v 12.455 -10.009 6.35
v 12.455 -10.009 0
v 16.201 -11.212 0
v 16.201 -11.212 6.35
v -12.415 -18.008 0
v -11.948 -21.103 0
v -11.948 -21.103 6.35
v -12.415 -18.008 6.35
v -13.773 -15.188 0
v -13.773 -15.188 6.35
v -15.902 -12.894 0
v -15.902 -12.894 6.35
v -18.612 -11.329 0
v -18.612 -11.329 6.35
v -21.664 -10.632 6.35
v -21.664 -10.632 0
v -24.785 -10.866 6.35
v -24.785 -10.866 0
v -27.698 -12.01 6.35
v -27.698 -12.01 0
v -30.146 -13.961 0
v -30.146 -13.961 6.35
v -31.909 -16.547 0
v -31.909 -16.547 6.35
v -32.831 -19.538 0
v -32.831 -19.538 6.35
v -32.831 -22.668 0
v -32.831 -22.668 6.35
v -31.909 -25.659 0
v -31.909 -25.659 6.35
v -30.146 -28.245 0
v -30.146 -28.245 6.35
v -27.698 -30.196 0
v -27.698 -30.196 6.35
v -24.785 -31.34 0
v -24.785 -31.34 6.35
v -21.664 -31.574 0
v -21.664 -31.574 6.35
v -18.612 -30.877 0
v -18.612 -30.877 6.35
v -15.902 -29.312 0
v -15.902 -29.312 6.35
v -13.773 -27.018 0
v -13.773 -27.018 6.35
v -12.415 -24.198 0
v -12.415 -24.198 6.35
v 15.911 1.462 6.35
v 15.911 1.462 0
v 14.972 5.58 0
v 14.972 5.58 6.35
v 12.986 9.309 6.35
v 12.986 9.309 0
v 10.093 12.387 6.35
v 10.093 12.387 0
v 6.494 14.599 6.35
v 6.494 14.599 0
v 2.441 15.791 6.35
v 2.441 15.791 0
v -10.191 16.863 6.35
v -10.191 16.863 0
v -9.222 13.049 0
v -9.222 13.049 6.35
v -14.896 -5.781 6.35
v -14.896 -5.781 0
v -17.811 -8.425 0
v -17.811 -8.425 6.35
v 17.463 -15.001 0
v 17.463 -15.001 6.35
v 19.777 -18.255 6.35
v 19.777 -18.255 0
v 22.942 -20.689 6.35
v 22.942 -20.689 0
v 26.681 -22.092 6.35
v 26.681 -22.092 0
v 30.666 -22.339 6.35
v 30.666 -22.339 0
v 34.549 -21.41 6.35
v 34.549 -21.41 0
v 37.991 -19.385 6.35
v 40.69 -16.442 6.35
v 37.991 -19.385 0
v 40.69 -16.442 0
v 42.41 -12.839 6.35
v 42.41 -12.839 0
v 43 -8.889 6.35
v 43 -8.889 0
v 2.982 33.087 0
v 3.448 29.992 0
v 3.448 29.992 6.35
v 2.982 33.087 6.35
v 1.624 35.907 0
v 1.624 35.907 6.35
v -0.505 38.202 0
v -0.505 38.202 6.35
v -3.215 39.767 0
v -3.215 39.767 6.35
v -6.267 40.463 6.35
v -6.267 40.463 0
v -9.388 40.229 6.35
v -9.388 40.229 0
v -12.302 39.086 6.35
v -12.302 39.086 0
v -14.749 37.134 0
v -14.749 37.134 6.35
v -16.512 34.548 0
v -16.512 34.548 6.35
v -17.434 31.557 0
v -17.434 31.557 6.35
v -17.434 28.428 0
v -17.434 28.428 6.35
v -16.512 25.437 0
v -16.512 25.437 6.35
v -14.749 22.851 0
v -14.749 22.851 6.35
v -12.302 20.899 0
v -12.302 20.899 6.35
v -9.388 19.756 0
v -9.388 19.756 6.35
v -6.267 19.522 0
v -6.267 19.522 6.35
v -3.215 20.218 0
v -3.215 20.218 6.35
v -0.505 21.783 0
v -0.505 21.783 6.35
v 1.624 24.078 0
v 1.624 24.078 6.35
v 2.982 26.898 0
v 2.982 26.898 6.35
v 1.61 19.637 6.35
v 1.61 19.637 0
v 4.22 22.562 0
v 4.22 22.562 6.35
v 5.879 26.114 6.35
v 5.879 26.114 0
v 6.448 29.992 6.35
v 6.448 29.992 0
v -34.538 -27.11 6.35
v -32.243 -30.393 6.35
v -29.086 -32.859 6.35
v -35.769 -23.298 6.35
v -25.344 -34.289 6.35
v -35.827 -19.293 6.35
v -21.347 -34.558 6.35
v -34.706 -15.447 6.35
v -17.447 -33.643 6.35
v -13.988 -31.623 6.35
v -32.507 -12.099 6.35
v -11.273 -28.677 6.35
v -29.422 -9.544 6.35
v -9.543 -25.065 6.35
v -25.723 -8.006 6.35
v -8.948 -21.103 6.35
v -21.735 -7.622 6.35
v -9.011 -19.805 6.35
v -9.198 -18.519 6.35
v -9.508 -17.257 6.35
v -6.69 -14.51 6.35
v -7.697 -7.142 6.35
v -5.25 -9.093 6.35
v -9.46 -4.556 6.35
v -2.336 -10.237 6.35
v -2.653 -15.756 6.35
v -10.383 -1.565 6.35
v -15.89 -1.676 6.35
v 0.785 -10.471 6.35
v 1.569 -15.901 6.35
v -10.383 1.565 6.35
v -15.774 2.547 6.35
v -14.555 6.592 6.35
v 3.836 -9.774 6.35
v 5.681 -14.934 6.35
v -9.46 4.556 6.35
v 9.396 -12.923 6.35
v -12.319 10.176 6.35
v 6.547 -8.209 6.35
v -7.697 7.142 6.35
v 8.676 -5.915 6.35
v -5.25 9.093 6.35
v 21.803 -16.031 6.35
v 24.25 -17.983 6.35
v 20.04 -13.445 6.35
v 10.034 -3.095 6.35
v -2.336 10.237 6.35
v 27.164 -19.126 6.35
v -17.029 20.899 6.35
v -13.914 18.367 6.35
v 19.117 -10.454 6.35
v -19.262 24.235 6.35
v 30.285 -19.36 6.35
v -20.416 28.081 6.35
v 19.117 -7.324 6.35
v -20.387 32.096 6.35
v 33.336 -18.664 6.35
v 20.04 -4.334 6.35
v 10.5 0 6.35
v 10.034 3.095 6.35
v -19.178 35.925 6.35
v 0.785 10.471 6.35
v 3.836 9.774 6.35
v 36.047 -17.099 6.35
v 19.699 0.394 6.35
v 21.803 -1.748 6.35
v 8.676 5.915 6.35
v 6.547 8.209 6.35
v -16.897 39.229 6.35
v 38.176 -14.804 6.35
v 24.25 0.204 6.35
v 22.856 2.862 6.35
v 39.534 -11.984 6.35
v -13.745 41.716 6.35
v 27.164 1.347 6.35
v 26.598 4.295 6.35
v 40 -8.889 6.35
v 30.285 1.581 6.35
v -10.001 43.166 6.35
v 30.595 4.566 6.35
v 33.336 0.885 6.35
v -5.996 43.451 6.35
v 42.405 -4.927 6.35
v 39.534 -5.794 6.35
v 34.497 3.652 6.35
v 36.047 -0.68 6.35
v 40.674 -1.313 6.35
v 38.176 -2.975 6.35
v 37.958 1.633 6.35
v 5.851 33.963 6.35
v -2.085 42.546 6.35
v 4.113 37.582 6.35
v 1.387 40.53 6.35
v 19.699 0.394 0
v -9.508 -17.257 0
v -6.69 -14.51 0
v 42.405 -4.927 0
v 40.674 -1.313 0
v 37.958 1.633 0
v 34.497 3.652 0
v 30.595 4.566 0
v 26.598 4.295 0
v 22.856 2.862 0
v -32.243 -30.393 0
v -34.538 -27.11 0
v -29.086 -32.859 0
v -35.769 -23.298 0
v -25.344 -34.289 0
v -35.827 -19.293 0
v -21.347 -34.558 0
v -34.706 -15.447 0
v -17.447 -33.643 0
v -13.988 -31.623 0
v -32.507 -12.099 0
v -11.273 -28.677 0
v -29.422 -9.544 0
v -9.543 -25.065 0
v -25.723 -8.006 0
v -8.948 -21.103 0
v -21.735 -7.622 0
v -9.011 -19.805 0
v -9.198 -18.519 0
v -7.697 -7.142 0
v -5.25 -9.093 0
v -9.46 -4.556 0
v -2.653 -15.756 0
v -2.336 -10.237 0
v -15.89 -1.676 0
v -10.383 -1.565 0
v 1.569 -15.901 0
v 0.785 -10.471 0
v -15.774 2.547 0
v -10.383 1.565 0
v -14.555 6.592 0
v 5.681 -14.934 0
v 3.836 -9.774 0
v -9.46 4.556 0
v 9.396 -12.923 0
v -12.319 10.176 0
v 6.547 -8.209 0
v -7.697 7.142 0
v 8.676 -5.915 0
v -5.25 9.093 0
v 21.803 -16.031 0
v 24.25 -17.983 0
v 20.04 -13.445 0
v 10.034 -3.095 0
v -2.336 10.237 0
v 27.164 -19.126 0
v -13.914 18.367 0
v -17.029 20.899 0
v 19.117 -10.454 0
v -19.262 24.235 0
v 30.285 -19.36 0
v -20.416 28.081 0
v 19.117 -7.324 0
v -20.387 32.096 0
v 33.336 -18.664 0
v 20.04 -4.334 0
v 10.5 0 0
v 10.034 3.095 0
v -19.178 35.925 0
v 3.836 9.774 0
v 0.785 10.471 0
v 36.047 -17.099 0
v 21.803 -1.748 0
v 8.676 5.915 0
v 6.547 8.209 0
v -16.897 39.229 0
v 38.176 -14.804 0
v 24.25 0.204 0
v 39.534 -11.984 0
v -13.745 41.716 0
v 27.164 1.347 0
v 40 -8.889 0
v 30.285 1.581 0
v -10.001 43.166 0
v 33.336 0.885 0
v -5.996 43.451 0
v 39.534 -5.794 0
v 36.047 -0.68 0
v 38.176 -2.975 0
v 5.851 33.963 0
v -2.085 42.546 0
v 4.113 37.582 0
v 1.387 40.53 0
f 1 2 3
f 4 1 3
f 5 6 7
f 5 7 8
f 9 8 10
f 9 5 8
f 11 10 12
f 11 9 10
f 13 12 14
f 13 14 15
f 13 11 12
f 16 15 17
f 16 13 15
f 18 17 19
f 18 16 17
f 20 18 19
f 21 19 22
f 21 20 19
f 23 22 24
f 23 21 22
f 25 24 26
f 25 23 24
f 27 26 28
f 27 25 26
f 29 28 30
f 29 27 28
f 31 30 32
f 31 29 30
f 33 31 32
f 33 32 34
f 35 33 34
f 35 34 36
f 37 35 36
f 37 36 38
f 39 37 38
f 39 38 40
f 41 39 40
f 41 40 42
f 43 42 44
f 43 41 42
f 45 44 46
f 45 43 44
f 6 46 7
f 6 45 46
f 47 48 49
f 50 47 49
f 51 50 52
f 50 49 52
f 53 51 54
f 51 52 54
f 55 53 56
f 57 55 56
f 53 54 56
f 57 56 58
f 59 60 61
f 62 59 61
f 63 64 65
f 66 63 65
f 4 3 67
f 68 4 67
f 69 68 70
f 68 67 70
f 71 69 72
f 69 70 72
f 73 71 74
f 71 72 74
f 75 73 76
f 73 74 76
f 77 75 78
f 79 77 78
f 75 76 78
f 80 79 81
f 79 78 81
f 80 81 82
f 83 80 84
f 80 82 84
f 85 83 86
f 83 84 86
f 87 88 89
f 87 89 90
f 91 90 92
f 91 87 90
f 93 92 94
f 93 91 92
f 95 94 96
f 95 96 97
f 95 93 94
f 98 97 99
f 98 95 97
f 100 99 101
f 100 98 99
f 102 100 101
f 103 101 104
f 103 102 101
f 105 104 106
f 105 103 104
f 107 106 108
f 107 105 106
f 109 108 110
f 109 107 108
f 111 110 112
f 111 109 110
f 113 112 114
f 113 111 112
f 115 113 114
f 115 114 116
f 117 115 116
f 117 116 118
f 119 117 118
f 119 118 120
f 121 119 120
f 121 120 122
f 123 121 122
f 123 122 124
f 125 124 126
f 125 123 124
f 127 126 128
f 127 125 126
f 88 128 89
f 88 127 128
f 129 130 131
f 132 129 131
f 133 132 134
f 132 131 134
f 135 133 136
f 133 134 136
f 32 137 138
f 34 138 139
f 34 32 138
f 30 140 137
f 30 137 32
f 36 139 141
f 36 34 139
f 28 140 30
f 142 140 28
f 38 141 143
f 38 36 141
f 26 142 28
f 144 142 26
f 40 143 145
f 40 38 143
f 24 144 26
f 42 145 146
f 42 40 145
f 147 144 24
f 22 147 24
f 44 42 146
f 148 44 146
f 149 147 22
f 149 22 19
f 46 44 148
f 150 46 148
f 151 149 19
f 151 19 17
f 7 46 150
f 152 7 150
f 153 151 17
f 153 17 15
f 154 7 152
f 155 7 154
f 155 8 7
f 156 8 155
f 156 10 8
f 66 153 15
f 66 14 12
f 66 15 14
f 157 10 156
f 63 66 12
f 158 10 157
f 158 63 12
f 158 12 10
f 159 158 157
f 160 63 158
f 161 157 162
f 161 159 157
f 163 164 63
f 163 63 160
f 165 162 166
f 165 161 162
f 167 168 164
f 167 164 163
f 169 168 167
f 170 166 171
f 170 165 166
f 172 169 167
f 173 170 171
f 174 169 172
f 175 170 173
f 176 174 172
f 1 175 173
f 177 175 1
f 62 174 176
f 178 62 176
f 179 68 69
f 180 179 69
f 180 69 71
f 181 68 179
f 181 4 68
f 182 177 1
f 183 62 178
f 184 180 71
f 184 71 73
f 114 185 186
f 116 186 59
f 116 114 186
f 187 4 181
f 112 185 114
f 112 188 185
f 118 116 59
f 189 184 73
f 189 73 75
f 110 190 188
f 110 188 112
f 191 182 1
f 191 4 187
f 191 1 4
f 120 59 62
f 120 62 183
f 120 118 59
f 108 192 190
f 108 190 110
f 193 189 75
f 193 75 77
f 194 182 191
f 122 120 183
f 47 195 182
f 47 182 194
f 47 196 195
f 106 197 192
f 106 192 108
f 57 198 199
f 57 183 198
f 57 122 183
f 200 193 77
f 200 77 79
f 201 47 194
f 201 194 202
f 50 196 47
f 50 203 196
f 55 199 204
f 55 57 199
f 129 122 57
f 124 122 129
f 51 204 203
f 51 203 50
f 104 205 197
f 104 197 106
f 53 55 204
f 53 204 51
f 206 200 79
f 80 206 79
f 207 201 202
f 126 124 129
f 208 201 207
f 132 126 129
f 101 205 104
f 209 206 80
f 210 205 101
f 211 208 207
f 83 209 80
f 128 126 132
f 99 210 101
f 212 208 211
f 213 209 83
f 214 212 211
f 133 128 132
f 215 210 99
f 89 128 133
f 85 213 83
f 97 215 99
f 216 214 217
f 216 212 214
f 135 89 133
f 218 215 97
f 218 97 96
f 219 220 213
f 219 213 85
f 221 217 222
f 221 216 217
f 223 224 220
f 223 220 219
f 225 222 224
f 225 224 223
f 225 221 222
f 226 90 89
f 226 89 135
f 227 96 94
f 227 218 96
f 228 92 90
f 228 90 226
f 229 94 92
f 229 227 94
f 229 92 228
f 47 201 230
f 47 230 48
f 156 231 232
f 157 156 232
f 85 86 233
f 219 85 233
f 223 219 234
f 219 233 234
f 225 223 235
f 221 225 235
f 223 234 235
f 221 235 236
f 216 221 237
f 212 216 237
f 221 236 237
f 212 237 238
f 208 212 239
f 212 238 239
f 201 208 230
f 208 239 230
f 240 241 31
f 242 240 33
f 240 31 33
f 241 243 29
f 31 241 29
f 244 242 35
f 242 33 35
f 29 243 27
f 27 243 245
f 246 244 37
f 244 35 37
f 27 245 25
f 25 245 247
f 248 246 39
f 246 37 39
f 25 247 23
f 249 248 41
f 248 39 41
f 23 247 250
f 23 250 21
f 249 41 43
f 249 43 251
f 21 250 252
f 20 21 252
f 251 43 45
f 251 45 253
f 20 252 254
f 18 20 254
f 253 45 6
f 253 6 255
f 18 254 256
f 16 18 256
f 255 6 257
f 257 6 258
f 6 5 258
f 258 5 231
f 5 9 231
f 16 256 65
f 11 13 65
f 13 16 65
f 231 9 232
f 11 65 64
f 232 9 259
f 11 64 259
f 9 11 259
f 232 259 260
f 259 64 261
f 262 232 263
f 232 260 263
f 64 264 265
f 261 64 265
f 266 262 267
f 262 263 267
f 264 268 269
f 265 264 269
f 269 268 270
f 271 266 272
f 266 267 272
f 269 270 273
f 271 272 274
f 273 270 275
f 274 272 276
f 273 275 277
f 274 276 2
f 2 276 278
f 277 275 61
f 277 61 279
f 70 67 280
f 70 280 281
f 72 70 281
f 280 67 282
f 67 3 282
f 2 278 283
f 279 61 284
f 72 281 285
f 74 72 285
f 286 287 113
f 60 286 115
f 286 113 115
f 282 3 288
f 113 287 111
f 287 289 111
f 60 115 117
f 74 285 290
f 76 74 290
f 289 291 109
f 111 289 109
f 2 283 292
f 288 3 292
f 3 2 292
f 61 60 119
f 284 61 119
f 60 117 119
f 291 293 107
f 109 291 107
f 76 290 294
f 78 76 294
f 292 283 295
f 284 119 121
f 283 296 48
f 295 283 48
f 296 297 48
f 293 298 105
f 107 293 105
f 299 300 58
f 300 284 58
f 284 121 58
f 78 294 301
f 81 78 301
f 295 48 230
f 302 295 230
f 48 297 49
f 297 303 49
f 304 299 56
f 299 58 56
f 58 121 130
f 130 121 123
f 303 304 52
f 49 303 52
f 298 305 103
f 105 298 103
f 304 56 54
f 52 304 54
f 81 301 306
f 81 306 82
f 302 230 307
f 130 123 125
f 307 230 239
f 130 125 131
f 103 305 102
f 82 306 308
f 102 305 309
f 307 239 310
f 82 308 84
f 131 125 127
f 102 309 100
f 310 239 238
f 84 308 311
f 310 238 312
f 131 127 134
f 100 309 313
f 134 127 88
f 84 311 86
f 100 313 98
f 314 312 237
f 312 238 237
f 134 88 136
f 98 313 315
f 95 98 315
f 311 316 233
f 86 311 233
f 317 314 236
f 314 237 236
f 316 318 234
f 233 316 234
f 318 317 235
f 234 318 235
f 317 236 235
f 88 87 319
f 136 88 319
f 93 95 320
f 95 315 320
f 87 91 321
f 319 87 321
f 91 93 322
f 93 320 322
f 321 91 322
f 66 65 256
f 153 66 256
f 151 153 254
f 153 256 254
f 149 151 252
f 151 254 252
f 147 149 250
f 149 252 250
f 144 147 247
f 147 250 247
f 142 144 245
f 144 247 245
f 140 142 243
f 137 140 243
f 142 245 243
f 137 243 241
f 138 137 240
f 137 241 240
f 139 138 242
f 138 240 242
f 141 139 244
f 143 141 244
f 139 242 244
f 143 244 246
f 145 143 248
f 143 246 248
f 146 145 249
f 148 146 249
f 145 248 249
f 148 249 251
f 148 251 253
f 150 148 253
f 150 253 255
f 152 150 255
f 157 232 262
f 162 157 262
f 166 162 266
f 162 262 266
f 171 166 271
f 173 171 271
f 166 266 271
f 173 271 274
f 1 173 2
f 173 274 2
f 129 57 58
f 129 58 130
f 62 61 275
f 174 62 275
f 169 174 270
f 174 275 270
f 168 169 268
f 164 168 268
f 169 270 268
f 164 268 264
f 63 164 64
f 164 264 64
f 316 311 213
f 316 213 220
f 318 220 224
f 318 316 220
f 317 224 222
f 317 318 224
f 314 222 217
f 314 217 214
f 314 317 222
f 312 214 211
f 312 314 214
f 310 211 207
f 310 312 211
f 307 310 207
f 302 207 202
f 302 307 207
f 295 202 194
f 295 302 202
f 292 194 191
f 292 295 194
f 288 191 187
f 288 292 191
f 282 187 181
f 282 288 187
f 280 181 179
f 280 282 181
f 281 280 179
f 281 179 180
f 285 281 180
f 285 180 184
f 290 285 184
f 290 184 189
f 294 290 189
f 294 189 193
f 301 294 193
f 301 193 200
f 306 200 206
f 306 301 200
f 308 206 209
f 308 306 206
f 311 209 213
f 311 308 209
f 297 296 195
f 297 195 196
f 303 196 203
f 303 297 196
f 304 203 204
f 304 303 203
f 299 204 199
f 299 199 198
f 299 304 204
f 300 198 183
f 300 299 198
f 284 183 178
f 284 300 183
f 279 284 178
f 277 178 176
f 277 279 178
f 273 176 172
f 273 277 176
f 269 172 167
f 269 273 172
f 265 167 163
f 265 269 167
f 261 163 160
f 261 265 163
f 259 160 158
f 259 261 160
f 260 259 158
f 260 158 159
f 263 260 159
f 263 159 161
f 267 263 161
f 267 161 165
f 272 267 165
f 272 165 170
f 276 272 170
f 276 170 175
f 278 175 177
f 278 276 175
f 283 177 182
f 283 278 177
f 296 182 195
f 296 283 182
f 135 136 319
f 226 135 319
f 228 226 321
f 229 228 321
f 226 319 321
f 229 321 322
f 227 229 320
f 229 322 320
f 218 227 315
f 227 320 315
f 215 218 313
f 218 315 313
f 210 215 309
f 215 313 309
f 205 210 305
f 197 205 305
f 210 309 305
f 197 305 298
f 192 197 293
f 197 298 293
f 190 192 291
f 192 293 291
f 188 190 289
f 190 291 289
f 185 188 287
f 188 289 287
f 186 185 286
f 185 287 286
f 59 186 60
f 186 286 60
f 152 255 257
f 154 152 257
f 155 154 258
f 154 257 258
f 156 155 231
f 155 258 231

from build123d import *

# Parameters (mm, degrees)
F0_R     = 10.5
F1_DEPTH = 6.35


with BuildPart() as f1:
    # F0 (on Top) → F1 (new body)
    with BuildSketch(Plane.XY):
        with BuildLine():
            ThreePointArc((6.44846, 29.992483), (-15.414201, 40.590403), (-10.190932, 16.862585))
            ThreePointArc((-10.190932, 16.862585), (-3.961799, 16.850813), (1.609508, 19.63699))
            ThreePointArc((1.609508, 19.63699), (5.17904, 24.277334), (6.44846, 29.992483))
        make_face()
        with Locations((-7.05154, 29.992483)):
            Circle(F0_R, mode=Mode.SUBTRACT)
        with BuildLine():
            Line((-14.895684, -5.7813), (-6.689736, -14.510419))
            ThreePointArc((-6.689736, -14.510419), (3.65694, -15.554151), (12.454594, -10.00939))
            Line((12.454594, -10.00939), (16.201378, -11.21237))
            ThreePointArc((16.201378, -11.21237), (16.574131, -4.994388), (19.698893, 0.394313))
            Line((19.698893, 0.394313), (15.911259, 1.461728))
            ThreePointArc((15.911259, 1.461728), (11.64182, 10.944078), (2.441089, 15.79069))
            Line((2.441089, 15.79069), (1.609508, 19.63699))
            ThreePointArc((1.609508, 19.63699), (-3.961799, 16.850813), (-10.190932, 16.862585))
            Line((-10.190932, 16.862585), (-9.221523, 13.048691))
            ThreePointArc((-9.221523, 13.048691), (-15.29876, 4.610072), (-14.895684, -5.7813))
        make_face()
        Circle(F0_R, mode=Mode.SUBTRACT)
        with BuildLine():
            Line((-9.507961, -17.256899), (-6.689736, -14.510419))
            Line((-6.689736, -14.510419), (-14.895684, -5.7813))
            Line((-14.895684, -5.7813), (-17.810886, -8.42462))
            ThreePointArc((-17.810886, -8.42462), (-12.612333, -11.856425), (-9.507961, -17.256899))
        make_face()
        with BuildLine():
            ThreePointArc((19.698893, 0.394313), (16.574131, -4.994388), (16.201378, -11.21237))
            ThreePointArc((16.201378, -11.21237), (30.665848, -22.338996), (43.000022, -8.889429))
            ThreePointArc((43.000022, -8.889429), (34.496759, 3.651808), (19.698893, 0.394313))
        make_face()
        with Locations((29.500022, -8.889429)):
            Circle(F0_R, mode=Mode.SUBTRACT)
        with BuildLine():
            ThreePointArc((-8.948482, -21.103054), (-9.089084, -19.159737), (-9.507961, -17.256899))
            ThreePointArc((-9.507961, -17.256899), (-12.612333, -11.856425), (-17.810886, -8.42462))
            ThreePointArc((-17.810886, -8.42462), (-33.513236, -28.837472), (-8.948482, -21.103054))
        make_face()
        with Locations((-22.448482, -21.103054)):
            Circle(F0_R, mode=Mode.SUBTRACT)
    extrude(amount=F1_DEPTH)


solid = f1.part
